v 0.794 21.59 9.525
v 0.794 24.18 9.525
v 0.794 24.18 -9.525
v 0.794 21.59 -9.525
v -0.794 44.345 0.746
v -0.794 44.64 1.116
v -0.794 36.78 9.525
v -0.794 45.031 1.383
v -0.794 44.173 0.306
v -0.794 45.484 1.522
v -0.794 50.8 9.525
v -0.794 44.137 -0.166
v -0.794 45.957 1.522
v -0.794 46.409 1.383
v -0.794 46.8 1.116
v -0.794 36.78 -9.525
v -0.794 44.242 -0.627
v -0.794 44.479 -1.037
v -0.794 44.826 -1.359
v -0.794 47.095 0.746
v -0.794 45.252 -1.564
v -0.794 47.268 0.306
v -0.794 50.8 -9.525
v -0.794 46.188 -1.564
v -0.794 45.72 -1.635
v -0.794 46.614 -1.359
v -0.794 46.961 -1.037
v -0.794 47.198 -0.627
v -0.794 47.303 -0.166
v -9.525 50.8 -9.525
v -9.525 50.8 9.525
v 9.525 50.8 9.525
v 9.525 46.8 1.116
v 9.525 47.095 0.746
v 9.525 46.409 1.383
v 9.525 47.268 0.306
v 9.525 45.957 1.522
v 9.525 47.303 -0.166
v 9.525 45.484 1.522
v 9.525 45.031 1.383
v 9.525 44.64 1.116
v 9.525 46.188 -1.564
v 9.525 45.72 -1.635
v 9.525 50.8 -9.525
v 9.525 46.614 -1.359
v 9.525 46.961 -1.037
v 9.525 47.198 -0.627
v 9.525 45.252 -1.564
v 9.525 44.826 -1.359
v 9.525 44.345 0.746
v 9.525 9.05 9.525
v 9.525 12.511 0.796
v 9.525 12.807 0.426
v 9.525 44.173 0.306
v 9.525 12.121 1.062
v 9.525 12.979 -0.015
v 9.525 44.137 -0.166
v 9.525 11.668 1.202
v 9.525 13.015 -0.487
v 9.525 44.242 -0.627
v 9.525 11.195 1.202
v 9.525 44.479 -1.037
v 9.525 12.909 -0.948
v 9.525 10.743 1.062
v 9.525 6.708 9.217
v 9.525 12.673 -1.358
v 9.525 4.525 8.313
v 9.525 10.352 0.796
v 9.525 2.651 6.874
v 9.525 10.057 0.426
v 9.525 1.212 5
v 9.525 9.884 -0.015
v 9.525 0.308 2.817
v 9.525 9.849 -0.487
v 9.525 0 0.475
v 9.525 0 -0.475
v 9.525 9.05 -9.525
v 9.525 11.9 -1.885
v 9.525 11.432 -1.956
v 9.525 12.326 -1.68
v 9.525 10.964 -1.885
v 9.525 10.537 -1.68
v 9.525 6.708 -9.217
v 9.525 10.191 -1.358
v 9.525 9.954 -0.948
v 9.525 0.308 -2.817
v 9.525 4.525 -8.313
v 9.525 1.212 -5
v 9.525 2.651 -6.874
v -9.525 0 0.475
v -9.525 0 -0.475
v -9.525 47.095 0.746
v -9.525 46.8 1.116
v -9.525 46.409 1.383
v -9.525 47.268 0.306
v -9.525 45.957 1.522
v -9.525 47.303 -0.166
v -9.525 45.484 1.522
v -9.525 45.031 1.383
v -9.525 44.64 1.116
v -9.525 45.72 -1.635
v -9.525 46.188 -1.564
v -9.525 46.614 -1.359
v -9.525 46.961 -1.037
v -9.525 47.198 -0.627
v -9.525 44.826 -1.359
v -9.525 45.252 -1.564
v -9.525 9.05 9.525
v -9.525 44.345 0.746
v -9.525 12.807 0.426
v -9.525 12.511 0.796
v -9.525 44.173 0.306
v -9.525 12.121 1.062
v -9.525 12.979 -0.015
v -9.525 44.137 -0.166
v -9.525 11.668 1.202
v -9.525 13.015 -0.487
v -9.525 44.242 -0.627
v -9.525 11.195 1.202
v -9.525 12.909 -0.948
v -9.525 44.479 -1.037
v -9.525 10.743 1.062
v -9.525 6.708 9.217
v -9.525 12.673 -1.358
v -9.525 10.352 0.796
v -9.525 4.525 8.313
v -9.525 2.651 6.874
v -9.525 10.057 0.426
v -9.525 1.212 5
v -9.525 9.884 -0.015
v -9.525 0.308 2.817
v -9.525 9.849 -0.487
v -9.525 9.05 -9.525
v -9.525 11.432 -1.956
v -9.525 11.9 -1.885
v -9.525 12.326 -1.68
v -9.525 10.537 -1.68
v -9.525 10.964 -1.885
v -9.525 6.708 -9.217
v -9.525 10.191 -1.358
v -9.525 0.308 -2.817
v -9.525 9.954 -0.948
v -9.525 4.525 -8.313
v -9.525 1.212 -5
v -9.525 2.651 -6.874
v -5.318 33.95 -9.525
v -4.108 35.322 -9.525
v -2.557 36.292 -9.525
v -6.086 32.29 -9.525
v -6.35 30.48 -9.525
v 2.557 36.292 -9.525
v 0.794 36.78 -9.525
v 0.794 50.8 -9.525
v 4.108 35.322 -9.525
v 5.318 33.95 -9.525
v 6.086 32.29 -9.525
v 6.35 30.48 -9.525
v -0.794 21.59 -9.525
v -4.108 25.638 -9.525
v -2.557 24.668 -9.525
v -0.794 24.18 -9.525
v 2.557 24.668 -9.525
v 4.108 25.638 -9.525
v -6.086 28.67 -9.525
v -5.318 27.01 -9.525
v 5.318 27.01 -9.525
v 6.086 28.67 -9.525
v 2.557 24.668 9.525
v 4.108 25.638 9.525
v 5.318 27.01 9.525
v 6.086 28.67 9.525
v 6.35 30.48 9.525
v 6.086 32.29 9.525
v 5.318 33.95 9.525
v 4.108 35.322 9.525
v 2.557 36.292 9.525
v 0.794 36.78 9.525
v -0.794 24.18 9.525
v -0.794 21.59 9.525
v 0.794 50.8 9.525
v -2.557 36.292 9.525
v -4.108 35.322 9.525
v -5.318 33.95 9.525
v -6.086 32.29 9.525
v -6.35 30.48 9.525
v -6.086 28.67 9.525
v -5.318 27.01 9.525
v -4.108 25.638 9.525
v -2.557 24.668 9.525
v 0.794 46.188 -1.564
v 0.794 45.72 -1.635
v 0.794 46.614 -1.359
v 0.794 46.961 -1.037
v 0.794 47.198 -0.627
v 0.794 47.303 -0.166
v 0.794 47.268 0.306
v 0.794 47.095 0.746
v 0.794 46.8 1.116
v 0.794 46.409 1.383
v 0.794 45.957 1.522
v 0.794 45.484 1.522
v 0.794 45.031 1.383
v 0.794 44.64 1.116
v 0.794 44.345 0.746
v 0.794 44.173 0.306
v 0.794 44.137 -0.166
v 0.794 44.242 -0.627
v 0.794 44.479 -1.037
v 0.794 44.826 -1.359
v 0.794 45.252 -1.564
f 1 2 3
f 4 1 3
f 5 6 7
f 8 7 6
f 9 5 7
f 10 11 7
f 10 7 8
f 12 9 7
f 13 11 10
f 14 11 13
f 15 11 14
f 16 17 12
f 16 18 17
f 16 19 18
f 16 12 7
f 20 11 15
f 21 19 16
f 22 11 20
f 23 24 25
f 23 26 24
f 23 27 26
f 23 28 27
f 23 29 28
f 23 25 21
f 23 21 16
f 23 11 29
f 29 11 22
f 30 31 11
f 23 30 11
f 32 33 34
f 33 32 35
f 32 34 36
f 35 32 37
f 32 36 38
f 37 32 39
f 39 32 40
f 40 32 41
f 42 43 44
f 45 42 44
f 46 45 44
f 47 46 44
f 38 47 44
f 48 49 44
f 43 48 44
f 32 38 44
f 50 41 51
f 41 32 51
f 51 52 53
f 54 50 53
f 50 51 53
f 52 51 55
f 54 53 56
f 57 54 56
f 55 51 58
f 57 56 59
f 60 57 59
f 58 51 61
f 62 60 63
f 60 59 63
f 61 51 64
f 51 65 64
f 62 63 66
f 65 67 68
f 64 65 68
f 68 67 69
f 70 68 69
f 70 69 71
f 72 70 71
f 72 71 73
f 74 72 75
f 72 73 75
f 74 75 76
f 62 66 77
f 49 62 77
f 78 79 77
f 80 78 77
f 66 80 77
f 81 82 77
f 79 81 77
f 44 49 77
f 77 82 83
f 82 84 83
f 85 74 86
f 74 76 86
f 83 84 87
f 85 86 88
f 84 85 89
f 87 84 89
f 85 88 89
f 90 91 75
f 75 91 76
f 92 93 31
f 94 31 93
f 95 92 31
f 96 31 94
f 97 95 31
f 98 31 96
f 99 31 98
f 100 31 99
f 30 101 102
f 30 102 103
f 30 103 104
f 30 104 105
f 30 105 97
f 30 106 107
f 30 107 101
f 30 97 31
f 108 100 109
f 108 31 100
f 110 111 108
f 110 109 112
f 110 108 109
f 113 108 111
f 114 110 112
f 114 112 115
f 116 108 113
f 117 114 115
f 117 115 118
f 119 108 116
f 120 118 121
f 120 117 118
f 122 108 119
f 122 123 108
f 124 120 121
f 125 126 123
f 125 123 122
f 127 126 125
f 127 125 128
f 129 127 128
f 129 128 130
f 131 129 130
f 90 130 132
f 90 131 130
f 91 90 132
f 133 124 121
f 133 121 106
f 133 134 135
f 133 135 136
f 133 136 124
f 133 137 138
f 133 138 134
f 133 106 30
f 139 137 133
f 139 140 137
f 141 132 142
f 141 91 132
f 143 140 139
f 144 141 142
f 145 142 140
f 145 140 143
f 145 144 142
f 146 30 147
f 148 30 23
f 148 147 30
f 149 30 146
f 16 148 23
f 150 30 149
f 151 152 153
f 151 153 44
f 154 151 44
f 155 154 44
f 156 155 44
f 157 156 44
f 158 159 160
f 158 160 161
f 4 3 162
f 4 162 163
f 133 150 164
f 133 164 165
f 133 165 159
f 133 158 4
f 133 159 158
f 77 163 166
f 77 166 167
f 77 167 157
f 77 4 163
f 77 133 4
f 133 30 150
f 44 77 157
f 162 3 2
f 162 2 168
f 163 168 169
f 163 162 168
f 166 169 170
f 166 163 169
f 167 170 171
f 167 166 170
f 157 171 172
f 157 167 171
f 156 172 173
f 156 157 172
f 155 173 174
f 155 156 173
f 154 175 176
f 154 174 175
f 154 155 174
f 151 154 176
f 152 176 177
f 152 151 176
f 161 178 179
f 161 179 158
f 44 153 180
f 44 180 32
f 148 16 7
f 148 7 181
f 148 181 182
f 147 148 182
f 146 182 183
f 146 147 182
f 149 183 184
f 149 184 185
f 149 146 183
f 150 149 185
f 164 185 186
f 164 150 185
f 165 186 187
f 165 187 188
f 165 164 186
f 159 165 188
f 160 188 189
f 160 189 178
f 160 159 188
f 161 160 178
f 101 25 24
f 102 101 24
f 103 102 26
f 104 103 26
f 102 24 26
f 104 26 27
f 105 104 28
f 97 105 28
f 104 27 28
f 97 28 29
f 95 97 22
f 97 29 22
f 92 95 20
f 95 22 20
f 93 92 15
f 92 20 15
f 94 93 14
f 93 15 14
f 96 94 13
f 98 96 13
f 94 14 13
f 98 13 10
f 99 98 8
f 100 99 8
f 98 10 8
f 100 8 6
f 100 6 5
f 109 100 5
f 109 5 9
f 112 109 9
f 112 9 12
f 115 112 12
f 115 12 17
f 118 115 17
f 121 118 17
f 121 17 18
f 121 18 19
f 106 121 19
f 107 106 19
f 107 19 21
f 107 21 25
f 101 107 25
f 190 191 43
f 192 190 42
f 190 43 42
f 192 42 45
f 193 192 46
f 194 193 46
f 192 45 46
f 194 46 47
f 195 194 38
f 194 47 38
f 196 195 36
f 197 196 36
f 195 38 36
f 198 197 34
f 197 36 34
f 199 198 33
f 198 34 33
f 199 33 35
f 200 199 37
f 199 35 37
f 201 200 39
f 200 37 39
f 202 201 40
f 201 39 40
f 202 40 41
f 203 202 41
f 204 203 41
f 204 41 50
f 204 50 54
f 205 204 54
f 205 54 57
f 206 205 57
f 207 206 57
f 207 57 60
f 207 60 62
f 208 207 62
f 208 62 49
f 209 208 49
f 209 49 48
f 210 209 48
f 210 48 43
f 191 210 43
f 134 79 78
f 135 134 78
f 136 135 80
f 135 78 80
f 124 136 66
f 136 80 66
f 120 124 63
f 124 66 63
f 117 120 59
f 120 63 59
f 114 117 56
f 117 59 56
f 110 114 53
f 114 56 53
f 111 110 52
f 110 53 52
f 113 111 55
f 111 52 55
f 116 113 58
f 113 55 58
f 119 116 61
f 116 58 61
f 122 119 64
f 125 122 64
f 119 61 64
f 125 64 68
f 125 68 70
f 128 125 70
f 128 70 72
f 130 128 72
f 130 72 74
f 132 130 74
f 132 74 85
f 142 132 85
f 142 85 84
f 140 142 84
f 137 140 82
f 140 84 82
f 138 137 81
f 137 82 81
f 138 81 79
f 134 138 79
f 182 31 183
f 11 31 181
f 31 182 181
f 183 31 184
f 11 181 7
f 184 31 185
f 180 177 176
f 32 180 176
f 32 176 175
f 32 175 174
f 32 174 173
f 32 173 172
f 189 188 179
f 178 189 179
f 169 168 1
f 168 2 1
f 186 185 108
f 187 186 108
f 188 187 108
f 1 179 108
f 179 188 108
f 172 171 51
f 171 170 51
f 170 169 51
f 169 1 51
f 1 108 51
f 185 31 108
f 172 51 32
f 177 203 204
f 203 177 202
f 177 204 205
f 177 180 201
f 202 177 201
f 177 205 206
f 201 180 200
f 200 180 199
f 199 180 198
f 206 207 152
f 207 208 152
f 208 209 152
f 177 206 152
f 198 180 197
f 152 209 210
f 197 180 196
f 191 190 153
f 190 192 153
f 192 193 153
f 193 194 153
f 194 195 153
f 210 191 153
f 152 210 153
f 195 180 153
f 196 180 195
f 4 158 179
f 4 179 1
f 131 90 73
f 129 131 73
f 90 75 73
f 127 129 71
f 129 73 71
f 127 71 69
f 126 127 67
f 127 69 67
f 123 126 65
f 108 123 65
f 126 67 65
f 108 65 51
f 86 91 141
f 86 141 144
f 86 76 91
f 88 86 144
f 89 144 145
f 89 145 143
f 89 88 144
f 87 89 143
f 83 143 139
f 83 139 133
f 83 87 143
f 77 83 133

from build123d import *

# Parameters (mm, degrees)
SKETCH1_W           = 19.05
SKETCH1_H           = 19.05
BOSS_EXTRUDE1_DEPTH = 50.8
SKETCH4_W           = 1.5875
SKETCH4_H           = 19.05
CUT_EXTRUDE1_DEPTH  = 29.21
CUT_EXTRUDE2_START  = -19.05
SKETCH5_R           = 6.35
CUT_EXTRUDE2_DEPTH  = 19.05
FILLET3_R           = 9.05
SKETCH6_R           = 1.5875
CUT_EXTRUDE3_DEPTH  = 19.05


with BuildPart() as part:
    # Sketch1 → Boss-Extrude1 (new body)
    with BuildSketch(Plane(origin=(0, 0, 0), x_dir=(1, 0, 0), z_dir=(0, 1, 0))):
        Rectangle(SKETCH1_W, SKETCH1_H)
    extrude(amount=BOSS_EXTRUDE1_DEPTH)

    # Sketch4 → Cut-Extrude1 (cut)
    with BuildSketch(Plane(origin=(0, 50.8, 0), x_dir=(1, 0, 0), z_dir=(0, 1, 0))):
        Rectangle(SKETCH4_W, SKETCH4_H)
    extrude(amount=-CUT_EXTRUDE1_DEPTH, mode=Mode.SUBTRACT)

    # Sketch5 → Cut-Extrude2 (cut)
    with BuildSketch(Plane.XY.offset(9.525).offset(CUT_EXTRUDE2_START)):
        with Locations((0, 30.48)):
            Circle(SKETCH5_R)
    extrude(amount=CUT_EXTRUDE2_DEPTH, mode=Mode.SUBTRACT)

    # Fillet3
    fillet3_edges = [part.edges().sort_by_distance(p)[0] for p in [
        (0, 0, 9.525),
        (0, 0, -9.525),
    ]]
    fillet(fillet3_edges, radius=FILLET3_R)

    # Sketch6 → Cut-Extrude3 (cut)
    with BuildSketch(Plane(origin=(9.525, 0, 0), x_dir=(0, 0, -1), z_dir=(1, 0, 0))):
        with Locations((0.047497924, 45.720222057)):
            Circle(SKETCH6_R)
        with Locations((0.368108908, 11.431720944)):
            Circle(SKETCH6_R)
    extrude(amount=-CUT_EXTRUDE3_DEPTH, mode=Mode.SUBTRACT)


solid = part.part
